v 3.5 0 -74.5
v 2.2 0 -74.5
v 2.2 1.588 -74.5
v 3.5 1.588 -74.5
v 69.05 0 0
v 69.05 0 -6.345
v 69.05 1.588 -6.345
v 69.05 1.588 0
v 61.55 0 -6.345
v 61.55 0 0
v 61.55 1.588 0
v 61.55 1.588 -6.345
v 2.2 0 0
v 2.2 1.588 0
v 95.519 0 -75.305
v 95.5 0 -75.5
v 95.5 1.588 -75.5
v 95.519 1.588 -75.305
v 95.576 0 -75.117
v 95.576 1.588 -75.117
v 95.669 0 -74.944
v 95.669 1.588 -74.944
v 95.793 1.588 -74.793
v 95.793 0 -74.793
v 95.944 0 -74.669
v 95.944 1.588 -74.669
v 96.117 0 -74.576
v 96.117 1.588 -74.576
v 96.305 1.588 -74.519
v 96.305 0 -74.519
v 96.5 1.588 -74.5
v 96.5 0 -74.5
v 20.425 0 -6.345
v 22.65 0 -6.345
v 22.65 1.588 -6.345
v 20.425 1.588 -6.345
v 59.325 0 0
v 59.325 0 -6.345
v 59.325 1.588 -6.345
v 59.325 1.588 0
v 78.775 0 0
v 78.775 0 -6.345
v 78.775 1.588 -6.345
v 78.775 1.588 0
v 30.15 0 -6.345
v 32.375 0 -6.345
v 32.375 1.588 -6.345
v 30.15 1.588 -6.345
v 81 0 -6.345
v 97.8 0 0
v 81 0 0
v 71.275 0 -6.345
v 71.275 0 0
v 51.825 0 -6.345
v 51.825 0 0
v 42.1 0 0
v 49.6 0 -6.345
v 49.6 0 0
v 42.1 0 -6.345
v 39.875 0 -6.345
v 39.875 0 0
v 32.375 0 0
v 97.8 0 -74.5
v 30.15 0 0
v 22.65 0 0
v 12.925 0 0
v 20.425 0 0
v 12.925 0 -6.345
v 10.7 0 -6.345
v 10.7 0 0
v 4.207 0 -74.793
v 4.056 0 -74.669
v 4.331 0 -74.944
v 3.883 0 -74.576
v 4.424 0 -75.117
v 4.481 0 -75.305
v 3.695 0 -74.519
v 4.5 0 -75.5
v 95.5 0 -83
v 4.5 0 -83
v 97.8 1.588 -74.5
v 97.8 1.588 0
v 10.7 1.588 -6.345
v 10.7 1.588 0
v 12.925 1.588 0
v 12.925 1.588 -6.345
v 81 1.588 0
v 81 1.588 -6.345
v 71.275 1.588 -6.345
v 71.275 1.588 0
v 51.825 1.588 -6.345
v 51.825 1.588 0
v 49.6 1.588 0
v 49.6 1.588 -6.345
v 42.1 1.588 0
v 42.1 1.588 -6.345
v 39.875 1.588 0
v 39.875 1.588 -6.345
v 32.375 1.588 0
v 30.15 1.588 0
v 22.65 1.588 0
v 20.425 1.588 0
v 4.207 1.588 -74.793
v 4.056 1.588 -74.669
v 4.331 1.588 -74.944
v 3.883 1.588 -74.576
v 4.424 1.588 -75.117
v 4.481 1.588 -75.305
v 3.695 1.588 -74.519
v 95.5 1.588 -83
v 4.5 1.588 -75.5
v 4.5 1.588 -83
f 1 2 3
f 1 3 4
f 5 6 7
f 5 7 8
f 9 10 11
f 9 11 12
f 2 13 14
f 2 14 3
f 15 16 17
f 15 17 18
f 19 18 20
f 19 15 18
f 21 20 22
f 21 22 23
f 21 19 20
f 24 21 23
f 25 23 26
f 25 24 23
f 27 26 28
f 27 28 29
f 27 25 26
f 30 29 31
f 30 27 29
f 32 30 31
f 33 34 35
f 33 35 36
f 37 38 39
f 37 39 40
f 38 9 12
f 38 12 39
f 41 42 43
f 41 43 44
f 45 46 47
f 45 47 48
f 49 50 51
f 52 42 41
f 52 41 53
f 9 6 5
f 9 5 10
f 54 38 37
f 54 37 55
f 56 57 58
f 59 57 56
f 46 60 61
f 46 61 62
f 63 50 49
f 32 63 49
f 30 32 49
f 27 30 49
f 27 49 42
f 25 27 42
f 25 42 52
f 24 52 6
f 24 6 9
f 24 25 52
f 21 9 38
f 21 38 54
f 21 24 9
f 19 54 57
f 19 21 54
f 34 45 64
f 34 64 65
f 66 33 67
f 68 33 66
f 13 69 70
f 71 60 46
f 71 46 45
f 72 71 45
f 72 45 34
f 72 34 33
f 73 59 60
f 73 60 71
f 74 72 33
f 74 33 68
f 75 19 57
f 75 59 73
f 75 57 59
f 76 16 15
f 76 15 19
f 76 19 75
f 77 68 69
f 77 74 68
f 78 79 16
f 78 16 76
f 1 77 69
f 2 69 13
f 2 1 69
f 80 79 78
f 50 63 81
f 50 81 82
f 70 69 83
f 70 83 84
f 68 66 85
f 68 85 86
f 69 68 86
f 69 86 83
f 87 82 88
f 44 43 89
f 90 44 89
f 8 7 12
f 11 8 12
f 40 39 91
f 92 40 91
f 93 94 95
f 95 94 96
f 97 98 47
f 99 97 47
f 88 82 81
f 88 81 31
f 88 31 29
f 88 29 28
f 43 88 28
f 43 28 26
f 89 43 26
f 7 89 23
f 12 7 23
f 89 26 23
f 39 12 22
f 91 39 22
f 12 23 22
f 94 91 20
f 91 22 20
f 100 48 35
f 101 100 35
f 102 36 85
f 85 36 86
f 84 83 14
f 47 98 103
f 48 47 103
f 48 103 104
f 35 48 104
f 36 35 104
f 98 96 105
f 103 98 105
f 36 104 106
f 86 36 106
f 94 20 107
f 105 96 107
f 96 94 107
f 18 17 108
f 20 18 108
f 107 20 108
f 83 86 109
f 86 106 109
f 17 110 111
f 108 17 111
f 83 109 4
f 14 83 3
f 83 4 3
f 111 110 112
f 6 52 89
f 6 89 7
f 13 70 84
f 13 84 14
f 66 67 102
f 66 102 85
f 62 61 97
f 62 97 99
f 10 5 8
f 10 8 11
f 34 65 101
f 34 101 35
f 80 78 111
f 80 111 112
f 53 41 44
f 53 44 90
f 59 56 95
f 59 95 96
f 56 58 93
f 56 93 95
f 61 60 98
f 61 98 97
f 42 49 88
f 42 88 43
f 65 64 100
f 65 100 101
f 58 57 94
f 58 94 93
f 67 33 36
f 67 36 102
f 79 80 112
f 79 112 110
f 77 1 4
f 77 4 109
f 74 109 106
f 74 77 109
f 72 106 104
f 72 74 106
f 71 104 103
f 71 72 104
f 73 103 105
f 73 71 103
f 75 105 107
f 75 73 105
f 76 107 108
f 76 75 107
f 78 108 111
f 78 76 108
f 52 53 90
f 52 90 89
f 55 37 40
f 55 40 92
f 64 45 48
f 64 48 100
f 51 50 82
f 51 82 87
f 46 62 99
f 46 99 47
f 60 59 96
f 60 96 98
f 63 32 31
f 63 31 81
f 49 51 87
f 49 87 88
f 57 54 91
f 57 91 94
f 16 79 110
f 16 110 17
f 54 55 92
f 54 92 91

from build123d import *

# Parameters (mm, degrees)
BOSS_EXTRUDE1_DEPTH = 1.5875


with BuildPart() as part:
    # Sketch1 → Boss-Extrude1 (new body)
    with BuildSketch(Plane(origin=(0, 0, 0), x_dir=(1, 0, 0), z_dir=(0, 1, 0))):
        with BuildLine():
            Line((4.5, 75.5), (4.5, 83))
            Line((4.5, 83), (95.5, 83))
            Line((95.5, 83), (95.5, 75.5))
            ThreePointArc((95.5, 75.5), (95.792893219, 74.792893219), (96.5, 74.5))
            Line((96.5, 74.5), (97.8, 74.5))
            Line((97.8, 74.5), (97.8, 0))
            Line((97.8, 0), (81, 0))
            Line((81, 0), (81, 6.344902398))
            Line((81, 6.344902398), (78.775, 6.344902398))
            Line((78.775, 6.344902398), (78.775, 0))
            Line((78.775, 0), (71.275, 0))
            Line((71.275, 0), (71.275, 6.344902398))
            Line((71.275, 6.344902398), (69.05, 6.344902398))
            Line((69.05, 6.344902398), (69.05, 0))
            Line((69.05, 0), (61.55, 0))
            Line((61.55, 0), (61.55, 6.344902398))
            Line((61.55, 6.344902398), (59.325, 6.344902398))
            Line((59.325, 6.344902398), (59.325, 0))
            Line((59.325, 0), (51.825, 0))
            Line((51.825, 0), (51.825, 6.344902398))
            Line((51.825, 6.344902398), (49.6, 6.344902398))
            Line((49.6, 6.344902398), (49.6, 0))
            Line((49.6, 0), (42.1, 0))
            Line((42.1, 0), (42.1, 6.344902398))
            Line((42.1, 6.344902398), (39.875, 6.344902398))
            Line((39.875, 6.344902398), (39.875, 0))
            Line((39.875, 0), (32.375, 0))
            Line((32.375, 0), (32.375, 6.344902398))
            Line((32.375, 6.344902398), (30.15, 6.344902398))
            Line((30.15, 6.344902398), (30.15, 0))
            Line((30.15, 0), (22.65, 0))
            Line((22.65, 0), (22.65, 6.344902398))
            Line((22.65, 6.344902398), (20.425, 6.344902398))
            Line((20.425, 6.344902398), (20.425, 0))
            Line((20.425, 0), (12.925, 0))
            Line((12.925, 0), (12.925, 6.344902398))
            Line((12.925, 6.344902398), (10.7, 6.344902398))
            Line((10.7, 6.344902398), (10.7, 0))
            Line((10.7, 0), (2.2, 0))
            Line((2.2, 0), (2.2, 74.5))
            Line((2.2, 74.5), (3.5, 74.5))
            ThreePointArc((3.5, 74.5), (4.207106781, 74.792893219), (4.5, 75.5))
        make_face()
    extrude(amount=BOSS_EXTRUDE1_DEPTH)


solid = part.part
